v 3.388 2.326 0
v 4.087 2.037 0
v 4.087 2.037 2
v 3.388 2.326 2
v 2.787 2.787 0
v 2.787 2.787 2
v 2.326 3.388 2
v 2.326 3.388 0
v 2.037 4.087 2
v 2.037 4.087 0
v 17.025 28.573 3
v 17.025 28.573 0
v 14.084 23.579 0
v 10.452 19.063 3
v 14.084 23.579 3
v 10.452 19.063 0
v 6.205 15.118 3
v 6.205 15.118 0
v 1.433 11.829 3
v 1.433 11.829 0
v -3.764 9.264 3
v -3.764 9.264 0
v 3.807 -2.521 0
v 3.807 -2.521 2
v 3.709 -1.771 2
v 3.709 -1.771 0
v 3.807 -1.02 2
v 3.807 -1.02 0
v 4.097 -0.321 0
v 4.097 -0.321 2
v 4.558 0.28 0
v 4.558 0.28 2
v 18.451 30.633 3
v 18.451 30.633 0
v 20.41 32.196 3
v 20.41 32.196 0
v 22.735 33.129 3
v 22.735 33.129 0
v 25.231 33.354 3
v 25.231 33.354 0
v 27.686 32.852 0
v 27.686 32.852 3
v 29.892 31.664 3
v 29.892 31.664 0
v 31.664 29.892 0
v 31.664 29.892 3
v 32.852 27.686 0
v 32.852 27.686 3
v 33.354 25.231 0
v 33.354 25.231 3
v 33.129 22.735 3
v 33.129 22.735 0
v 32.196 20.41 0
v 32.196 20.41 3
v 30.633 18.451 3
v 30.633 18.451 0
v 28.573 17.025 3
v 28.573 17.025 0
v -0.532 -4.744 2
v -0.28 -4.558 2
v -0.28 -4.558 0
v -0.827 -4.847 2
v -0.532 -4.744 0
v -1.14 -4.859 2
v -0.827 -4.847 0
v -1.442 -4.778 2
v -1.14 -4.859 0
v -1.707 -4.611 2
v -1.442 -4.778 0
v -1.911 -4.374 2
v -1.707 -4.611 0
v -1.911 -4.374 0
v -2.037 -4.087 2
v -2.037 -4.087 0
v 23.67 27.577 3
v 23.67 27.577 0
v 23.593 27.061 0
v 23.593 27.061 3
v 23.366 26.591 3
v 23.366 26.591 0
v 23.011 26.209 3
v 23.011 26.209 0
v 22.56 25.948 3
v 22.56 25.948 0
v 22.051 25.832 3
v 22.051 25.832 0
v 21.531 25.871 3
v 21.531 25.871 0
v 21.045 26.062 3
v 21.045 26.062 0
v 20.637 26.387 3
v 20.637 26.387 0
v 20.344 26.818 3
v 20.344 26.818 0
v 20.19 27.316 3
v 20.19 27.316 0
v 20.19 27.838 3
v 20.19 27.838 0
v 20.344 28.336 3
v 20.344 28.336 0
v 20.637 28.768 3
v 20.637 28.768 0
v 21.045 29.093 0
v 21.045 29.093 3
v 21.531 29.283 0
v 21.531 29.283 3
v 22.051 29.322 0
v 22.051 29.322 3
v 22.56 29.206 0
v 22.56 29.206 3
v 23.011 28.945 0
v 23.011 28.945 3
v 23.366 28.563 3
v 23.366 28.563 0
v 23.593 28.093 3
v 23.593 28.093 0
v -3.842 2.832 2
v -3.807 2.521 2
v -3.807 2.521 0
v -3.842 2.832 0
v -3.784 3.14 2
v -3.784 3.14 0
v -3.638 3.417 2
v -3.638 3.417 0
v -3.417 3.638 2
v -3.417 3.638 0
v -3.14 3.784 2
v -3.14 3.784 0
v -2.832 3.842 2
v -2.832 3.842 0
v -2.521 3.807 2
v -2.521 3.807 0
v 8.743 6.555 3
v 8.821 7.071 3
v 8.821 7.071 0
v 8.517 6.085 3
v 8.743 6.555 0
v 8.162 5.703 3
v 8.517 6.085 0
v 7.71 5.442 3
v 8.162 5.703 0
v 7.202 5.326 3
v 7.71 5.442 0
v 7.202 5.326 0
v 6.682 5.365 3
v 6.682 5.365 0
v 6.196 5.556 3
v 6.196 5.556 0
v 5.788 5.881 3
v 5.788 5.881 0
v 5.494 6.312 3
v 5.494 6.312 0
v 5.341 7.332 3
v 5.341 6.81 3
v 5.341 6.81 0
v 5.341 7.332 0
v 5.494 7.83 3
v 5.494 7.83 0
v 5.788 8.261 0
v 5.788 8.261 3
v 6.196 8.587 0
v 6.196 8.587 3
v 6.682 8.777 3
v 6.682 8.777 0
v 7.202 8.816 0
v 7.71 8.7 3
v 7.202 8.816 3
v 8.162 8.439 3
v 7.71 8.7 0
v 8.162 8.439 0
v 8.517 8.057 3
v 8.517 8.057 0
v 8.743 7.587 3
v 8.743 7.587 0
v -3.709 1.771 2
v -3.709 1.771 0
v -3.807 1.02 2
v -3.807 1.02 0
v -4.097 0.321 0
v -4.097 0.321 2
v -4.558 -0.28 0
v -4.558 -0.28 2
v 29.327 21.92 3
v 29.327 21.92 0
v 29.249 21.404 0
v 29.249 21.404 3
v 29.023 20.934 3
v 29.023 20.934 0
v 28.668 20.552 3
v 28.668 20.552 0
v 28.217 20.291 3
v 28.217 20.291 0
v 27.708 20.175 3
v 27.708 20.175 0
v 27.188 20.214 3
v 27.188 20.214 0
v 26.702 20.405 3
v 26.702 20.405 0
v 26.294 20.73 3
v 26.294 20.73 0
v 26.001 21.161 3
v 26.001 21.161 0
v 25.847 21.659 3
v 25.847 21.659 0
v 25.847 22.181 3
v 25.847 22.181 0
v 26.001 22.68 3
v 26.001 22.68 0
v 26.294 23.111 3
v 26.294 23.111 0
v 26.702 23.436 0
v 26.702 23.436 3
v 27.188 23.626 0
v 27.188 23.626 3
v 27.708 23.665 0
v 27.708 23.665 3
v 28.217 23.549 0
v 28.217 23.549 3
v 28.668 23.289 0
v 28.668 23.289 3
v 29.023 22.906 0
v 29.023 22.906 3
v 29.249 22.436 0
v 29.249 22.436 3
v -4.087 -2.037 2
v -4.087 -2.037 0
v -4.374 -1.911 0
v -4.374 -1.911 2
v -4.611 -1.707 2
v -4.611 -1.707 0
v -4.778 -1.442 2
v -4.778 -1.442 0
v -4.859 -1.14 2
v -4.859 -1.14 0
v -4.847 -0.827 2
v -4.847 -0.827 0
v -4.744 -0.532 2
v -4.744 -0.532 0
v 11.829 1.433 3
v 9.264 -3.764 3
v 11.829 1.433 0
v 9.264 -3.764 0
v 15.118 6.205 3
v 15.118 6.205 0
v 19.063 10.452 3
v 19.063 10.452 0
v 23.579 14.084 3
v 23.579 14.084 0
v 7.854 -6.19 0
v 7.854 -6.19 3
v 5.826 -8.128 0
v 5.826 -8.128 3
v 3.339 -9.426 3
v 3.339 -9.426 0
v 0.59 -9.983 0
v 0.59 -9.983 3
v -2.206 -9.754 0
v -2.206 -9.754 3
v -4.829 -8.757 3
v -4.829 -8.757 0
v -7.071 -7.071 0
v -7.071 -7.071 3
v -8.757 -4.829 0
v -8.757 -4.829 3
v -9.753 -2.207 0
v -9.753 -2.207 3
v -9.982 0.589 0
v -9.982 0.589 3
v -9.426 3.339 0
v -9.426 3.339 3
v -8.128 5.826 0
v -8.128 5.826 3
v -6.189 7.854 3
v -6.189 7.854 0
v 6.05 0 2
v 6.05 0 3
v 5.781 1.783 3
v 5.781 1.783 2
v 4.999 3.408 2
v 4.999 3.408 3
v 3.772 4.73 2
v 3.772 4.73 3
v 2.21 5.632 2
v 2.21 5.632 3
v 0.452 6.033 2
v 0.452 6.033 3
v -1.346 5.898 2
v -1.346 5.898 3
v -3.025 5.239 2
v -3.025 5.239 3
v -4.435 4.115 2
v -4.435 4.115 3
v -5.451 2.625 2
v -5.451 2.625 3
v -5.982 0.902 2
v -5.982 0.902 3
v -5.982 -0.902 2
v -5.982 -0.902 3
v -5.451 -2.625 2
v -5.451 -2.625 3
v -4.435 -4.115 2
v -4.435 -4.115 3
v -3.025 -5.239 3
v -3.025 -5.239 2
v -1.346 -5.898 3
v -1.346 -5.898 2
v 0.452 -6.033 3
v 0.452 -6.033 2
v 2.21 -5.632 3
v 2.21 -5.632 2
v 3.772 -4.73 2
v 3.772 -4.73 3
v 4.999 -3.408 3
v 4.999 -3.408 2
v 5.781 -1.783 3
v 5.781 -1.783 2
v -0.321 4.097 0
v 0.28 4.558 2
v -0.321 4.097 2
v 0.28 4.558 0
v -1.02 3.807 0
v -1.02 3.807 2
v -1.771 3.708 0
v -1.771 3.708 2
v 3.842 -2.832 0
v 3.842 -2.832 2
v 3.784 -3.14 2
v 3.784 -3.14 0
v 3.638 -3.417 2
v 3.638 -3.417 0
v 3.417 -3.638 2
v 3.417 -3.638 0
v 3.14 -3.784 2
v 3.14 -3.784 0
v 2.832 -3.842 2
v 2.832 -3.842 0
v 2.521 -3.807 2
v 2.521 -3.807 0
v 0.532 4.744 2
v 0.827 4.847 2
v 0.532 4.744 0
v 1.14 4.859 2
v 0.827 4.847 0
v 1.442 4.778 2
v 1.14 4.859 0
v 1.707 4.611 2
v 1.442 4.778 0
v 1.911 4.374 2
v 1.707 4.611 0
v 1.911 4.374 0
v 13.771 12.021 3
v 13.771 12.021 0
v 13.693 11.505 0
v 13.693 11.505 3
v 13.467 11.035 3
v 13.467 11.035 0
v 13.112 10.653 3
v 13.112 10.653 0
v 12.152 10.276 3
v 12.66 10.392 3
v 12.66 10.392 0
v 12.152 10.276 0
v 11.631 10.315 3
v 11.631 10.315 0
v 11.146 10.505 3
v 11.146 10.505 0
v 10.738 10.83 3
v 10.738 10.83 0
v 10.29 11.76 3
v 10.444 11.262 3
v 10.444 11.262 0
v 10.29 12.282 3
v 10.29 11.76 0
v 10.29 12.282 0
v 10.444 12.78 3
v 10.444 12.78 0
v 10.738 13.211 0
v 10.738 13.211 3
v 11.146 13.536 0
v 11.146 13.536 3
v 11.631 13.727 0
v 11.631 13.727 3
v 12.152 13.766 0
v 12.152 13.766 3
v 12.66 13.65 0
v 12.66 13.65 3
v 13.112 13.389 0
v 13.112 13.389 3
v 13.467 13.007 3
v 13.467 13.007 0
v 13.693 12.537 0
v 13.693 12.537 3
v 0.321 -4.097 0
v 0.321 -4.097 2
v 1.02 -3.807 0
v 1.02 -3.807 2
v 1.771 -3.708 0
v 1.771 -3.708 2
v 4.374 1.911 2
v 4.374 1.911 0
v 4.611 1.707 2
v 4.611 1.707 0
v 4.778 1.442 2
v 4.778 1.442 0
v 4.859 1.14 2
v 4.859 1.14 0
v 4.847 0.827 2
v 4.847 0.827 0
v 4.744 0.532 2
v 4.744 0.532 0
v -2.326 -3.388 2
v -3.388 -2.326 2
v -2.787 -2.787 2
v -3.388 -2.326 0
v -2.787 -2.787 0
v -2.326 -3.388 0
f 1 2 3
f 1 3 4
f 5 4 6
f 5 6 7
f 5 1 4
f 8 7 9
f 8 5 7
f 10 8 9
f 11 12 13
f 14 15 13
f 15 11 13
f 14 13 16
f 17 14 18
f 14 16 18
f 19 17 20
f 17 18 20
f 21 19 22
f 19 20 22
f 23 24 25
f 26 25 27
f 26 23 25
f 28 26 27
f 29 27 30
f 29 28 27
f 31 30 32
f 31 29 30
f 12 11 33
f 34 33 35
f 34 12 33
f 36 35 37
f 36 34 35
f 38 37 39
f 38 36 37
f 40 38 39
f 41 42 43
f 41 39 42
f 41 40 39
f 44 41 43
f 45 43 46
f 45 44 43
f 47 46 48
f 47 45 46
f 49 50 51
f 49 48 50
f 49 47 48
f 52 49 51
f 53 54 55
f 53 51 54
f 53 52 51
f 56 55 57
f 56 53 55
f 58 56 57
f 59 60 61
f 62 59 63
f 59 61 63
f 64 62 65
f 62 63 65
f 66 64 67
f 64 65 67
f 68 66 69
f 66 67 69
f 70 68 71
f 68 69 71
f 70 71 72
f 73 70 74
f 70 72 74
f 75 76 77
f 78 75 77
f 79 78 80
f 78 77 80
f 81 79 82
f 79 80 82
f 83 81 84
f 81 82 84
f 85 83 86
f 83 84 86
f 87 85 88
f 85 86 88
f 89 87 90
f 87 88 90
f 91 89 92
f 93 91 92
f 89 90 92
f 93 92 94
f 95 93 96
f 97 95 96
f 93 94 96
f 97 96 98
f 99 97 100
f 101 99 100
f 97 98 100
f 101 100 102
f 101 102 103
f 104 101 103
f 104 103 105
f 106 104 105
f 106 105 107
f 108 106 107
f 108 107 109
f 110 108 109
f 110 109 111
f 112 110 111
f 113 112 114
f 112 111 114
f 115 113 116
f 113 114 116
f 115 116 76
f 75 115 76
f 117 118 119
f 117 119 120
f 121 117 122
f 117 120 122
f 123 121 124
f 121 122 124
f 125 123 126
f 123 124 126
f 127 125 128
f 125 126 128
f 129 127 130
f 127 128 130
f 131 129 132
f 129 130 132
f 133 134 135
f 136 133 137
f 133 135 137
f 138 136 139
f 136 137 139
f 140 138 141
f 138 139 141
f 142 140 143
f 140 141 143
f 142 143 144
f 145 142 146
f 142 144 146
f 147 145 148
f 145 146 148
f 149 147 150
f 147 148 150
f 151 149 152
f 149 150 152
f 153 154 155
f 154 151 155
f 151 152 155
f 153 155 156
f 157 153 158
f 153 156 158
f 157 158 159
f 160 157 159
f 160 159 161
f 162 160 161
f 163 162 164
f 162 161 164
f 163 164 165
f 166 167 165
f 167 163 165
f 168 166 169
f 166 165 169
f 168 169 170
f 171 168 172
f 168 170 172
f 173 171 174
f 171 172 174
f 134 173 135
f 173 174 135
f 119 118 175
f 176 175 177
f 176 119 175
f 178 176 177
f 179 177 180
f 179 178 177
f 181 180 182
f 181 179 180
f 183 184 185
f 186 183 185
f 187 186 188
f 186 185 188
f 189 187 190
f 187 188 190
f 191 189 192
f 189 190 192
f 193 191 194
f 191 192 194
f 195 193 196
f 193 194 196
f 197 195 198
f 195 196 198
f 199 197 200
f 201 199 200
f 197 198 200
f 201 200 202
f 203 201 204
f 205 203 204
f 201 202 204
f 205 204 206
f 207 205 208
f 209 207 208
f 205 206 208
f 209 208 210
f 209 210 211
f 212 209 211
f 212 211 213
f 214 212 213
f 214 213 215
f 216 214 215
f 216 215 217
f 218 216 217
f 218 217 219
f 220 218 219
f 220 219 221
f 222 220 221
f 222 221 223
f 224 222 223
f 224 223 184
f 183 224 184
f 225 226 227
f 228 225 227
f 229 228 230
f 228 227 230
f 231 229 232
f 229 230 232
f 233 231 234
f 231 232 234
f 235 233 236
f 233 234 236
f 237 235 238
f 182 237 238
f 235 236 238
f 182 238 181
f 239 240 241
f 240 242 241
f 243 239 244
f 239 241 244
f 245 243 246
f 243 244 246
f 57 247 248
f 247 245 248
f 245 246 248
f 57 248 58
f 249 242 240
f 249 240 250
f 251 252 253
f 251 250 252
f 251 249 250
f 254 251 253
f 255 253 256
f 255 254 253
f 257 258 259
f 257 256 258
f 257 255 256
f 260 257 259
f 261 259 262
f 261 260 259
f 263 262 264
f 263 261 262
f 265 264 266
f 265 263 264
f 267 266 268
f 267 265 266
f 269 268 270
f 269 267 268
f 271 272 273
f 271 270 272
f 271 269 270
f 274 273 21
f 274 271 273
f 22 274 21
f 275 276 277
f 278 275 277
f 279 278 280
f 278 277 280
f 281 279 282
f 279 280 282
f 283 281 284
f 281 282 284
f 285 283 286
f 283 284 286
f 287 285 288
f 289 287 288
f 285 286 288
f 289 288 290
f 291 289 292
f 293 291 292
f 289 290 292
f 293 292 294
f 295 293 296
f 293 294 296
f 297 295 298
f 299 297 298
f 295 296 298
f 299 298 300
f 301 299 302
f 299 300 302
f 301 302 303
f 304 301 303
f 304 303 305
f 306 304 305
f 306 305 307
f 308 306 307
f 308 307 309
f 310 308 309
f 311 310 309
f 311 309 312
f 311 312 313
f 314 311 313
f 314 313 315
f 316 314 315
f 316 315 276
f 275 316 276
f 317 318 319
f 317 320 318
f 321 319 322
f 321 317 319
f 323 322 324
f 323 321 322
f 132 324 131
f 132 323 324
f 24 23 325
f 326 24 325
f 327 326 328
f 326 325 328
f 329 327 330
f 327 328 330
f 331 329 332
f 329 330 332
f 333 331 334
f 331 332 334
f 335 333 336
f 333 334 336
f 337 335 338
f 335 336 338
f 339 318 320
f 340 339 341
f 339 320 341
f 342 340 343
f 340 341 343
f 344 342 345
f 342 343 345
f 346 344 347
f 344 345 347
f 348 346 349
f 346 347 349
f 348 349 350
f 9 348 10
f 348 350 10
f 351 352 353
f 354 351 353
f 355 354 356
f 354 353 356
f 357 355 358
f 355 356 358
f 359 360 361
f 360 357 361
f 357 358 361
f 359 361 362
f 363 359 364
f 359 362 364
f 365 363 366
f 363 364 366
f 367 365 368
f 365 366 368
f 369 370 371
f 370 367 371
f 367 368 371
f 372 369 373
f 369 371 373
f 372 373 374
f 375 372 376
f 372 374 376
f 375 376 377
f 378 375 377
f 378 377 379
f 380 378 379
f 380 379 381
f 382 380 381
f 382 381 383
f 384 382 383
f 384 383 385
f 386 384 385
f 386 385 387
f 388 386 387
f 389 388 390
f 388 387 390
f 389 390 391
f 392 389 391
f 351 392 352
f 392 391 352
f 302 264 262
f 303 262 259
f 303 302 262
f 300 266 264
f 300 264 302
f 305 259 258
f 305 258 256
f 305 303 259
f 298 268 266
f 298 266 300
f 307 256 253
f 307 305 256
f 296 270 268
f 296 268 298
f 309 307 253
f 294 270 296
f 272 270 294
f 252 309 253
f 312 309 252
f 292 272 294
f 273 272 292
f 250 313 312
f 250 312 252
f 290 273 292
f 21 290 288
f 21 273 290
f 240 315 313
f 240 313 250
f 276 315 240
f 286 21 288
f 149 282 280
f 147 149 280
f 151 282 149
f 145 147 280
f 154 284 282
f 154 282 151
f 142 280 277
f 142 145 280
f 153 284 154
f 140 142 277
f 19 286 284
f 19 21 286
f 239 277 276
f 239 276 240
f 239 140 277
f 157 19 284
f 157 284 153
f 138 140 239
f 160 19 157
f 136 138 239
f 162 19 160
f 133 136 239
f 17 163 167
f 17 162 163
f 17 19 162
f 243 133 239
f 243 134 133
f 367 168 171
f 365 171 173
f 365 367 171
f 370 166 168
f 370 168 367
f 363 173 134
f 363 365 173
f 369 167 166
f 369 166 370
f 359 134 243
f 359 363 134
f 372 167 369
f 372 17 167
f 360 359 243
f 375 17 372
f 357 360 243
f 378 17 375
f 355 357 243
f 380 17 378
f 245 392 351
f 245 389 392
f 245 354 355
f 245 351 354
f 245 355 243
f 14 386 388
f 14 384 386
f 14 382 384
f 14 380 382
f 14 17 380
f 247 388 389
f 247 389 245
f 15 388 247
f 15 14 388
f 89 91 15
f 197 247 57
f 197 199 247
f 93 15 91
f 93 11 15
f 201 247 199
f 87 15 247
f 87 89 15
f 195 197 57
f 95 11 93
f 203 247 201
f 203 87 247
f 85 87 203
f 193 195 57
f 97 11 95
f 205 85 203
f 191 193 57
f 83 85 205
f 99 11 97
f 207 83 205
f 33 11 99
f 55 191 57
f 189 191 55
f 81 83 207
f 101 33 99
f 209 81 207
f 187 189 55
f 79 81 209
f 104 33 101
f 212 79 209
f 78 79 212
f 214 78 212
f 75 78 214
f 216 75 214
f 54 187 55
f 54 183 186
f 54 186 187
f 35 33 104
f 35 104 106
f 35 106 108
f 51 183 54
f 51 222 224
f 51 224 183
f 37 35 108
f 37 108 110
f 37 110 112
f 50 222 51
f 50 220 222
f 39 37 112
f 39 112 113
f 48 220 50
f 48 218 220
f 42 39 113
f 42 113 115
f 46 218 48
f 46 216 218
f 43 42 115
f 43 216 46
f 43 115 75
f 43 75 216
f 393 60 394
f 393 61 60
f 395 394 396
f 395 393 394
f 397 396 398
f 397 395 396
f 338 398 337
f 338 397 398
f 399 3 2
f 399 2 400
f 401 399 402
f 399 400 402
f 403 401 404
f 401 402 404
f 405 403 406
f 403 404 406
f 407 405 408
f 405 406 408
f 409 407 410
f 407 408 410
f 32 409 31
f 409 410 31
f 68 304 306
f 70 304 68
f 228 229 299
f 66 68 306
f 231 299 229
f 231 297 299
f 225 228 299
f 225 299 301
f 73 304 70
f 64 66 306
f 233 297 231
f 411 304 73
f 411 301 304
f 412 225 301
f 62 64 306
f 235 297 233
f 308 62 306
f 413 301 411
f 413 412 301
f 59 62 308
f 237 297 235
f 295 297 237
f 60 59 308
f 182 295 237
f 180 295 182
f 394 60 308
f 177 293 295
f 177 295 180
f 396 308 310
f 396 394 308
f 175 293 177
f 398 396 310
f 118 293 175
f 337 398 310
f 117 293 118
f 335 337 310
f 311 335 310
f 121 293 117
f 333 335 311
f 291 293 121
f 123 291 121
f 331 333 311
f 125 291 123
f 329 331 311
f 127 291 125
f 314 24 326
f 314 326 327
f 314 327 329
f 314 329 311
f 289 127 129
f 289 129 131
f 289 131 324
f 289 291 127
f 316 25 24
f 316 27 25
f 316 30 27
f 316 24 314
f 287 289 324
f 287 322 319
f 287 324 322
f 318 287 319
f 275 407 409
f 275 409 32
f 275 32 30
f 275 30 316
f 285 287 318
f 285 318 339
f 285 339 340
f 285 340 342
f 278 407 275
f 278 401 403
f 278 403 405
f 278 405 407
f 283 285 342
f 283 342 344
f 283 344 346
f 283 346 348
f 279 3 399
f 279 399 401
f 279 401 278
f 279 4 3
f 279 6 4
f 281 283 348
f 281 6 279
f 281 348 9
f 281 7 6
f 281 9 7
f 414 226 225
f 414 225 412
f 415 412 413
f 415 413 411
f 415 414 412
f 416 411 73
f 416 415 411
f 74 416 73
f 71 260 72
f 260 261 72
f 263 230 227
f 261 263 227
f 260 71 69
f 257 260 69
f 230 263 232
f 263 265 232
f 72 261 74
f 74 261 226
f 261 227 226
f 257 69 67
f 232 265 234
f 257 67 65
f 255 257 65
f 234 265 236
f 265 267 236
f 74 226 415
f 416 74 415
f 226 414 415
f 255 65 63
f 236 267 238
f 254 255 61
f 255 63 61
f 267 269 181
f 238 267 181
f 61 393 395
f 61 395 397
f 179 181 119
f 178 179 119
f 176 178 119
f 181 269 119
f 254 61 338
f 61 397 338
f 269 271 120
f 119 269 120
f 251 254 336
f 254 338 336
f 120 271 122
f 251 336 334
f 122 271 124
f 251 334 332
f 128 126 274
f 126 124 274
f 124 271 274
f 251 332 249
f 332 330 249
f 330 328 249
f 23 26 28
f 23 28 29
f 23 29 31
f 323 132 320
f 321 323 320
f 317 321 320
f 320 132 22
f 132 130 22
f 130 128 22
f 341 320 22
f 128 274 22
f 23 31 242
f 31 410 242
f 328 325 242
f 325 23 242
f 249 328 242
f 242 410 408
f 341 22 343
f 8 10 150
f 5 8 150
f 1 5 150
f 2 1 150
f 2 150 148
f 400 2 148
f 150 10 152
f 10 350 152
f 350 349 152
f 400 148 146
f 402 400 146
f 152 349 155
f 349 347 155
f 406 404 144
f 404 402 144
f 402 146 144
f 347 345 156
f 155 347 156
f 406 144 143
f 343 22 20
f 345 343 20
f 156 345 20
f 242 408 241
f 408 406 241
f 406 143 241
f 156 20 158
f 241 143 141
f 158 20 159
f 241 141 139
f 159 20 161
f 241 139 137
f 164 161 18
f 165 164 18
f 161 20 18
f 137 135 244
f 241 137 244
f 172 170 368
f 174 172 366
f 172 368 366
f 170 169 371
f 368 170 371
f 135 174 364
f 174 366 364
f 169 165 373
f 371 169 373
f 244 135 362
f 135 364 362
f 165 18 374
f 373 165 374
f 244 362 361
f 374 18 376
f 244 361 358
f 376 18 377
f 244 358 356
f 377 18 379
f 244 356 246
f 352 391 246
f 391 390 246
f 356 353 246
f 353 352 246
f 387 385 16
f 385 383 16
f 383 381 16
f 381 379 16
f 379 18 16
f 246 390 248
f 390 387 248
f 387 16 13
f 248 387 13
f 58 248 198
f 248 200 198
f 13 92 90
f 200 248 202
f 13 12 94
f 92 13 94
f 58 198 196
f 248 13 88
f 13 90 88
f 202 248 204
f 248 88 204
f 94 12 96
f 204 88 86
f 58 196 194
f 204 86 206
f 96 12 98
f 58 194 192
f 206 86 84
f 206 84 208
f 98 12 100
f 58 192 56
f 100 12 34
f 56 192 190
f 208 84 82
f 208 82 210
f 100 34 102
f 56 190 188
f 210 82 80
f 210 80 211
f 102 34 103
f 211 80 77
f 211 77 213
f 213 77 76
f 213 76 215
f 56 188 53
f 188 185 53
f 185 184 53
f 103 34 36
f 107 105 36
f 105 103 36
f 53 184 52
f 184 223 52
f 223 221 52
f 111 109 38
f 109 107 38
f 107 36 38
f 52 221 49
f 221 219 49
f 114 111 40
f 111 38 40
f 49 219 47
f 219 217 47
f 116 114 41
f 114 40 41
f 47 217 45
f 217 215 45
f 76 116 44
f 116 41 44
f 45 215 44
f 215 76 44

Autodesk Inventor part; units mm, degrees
ref_plane "YZ Plane" through (0, 0, 0) normal (1, 0, 0) x (0, 1, 0)
ref_plane "XZ Plane" through (0, 0, 0) normal (0, 1, 0) x (-1, 0, 0)
ref_plane "XY Plane" through (0, 0, 0) normal (0, 0, 1) x (1, 0, 0)
sketch "スケッチ1" plane through (0, 0, 0) normal (0, 0, 1) x (1, 0, 0)
  line L0 (0, 0) -> (24.7487, 24.7487) construction
  line L1 (0, 0) -> (8.6903, 0) construction
  circle A0 centre (7.0711, 7.0711) radius 1.75
  circle A1 centre (12.0208, 12.0208) radius 1.75
  circle A2 centre (24.7487, 24.7487) radius 4.6188 construction
  circle A3 centre (24.7487, 24.7487) radius 8.6188
  line L2 (21.4828, 21.4828) -> (28.0147, 28.0147) construction
  circle A4 centre (29.2102, 23.5533) radius 4 construction
  circle A5 centre (21.4828, 21.4828) radius 4 construction
  circle A6 centre (23.5533, 29.2102) radius 4 construction
  circle A7 centre (29.2102, 23.5533) radius 1.5
  circle A8 centre (21.4828, 21.4828) radius 1.5
  circle A9 centre (23.5533, 29.2102) radius 1.5
  circle A10 centre (24.7487, 24.7487) radius 0.8755 construction
  circle A11 centre (0, 0) radius 5 construction
  arc A12 (5.7301, 8.1955) -> (7.0711, 7.0711) centre (0, 0) ccw
  arc A13 (-3.7643, 9.2644) -> (17.0249, 28.5731) centre (-18.8216, 46.3222) ccw
  arc A14 (28.5731, 17.0249) -> (9.2644, -3.7643) centre (46.3222, -18.8216) ccw
  line L3 (-4.8296, -1.2941) -> (-3.5355, 3.5355) construction
  line L4 (-3.5355, 3.5355) -> (1.2941, 4.8296) construction
  line L5 (1.2941, 4.8296) -> (4.8296, 1.2941) construction
  line L6 (4.8296, 1.2941) -> (3.5355, -3.5355) construction
  line L7 (3.5355, -3.5355) -> (-1.2941, -4.8296) construction
  line L8 (-1.2941, -4.8296) -> (-4.8296, -1.2941) construction
  arc A15 (-2.5213, 3.8073) -> (-3.8073, 2.5213) centre (-2.7931, 2.7931) ccw
  arc A16 (-4.5579, -0.2799) -> (-4.0872, -2.0366) centre (-3.8154, -1.0223) ccw
  arc A17 (-2.0366, -4.0872) -> (-0.2799, -4.5579) centre (-1.0223, -3.8154) ccw
  arc A18 (2.5213, -3.8073) -> (3.8073, -2.5213) centre (2.7931, -2.7931) ccw
  arc A19 (4.5579, 0.2799) -> (4.0872, 2.0366) centre (3.8154, 1.0223) ccw
  arc A20 (2.0366, 4.0872) -> (0.2799, 4.5579) centre (1.0223, 3.8154) ccw
  arc A21 (-2.5213, 3.8073) -> (0.2799, 4.5579) centre (-1.7707, 6.6085) ccw
  arc A22 (-4.5579, -0.2799) -> (-3.8073, 2.5213) centre (-6.6085, 1.7707) ccw
  arc A23 (-2.0366, -4.0872) -> (-4.0872, -2.0366) centre (-4.8377, -4.8377) ccw
  arc A24 (2.5213, -3.8073) -> (-0.2799, -4.5579) centre (1.7707, -6.6085) ccw
  arc A25 (4.5579, 0.2799) -> (3.8073, -2.5213) centre (6.6085, -1.7707) ccw
  arc A26 (2.0366, 4.0872) -> (4.0872, 2.0366) centre (4.8377, 4.8377) ccw
  circle A27 centre (0, 0) radius 6.05
  circle A28 centre (24.7487, 24.7487) radius 4 construction
  circle A29 centre (24.7487, 24.7487) radius 8
  line L9 (21.0131, 23.3188) -> (28.4844, 26.1787) construction
  circle A30 centre (21.9203, 27.5772) radius 4 construction
  circle A31 centre (27.5772, 21.9203) radius 4 construction
  circle A32 centre (21.9203, 27.5772) radius 3
  circle A33 centre (27.5772, 21.9203) radius 3
  line L10 (21.9203, 27.5772) -> (27.5772, 21.9203) construction
  circle A34 centre (21.9203, 27.5772) radius 1.75
  circle A35 centre (27.5772, 21.9203) radius 1.75
  point P0 (220.0202, -53)
  point P1 (-4.8296, -1.2941)
  point P2 (-1.2941, -4.8296)
  point P3 (3.5355, -3.5355)
  point P4 (4.8296, 1.2941)
  point P5 (4.0872, 2.0366)
  point P6 (4.5579, 0.2799)
  point P7 (3.8073, -2.5213)
  point P8 (2.5213, -3.8073)
  point P9 (-0.2799, -4.5579)
  point P10 (-2.0366, -4.0872)
  point P11 (-4.0872, -2.0366)
  point P12 (-4.5579, -0.2799)
  dimension "d2" = 3.5
  dimension "d15" = 10
  dimension "d0" = 35
  dimension "d1" = 45
  dimension "d3" = 3.5
  dimension "d4" = 10
  dimension "d5" = 7
  dimension "d10" = 17.2376
  dimension "d11" = 8
  dimension "d13" = 3
  dimension "d16" = 20
  dimension "d17" = 40
  dimension "d22" = 360
  dimension "d26" = 360
  dimension "d28" = 1.05
  dimension "d29" = 12.1
  dimension "d32" = 16
  dimension "d33" = 8
  dimension "d34" = 6
  dimension "d35" = 6
  dimension "d36" = 3.5
  dimension "d37" = 3.5
extrude "押し出し1" add sketch "スケッチ1" along normal blind 3 contours A0 A12 A13 A3 A14 | A0 A12 | A3 | A7 A33 | A33 A7 A35 | A7 A35 A33 | A8 | A9 A32 | A32 A9 A34 | A9 A34 A32 | A27 | A29
sketch "スケッチ2" plane through (0, 0, 3) normal (0, 0, 1) x (1, 0, 0)
  circle A0 centre (0, 0) radius 6.05 projected
extrude "押し出し2" cut sketch "スケッチ2" against normal blind 1
equation "\"d37\" = d36"
properties part number "原動節" material "アルミニウム 2014-T4"
